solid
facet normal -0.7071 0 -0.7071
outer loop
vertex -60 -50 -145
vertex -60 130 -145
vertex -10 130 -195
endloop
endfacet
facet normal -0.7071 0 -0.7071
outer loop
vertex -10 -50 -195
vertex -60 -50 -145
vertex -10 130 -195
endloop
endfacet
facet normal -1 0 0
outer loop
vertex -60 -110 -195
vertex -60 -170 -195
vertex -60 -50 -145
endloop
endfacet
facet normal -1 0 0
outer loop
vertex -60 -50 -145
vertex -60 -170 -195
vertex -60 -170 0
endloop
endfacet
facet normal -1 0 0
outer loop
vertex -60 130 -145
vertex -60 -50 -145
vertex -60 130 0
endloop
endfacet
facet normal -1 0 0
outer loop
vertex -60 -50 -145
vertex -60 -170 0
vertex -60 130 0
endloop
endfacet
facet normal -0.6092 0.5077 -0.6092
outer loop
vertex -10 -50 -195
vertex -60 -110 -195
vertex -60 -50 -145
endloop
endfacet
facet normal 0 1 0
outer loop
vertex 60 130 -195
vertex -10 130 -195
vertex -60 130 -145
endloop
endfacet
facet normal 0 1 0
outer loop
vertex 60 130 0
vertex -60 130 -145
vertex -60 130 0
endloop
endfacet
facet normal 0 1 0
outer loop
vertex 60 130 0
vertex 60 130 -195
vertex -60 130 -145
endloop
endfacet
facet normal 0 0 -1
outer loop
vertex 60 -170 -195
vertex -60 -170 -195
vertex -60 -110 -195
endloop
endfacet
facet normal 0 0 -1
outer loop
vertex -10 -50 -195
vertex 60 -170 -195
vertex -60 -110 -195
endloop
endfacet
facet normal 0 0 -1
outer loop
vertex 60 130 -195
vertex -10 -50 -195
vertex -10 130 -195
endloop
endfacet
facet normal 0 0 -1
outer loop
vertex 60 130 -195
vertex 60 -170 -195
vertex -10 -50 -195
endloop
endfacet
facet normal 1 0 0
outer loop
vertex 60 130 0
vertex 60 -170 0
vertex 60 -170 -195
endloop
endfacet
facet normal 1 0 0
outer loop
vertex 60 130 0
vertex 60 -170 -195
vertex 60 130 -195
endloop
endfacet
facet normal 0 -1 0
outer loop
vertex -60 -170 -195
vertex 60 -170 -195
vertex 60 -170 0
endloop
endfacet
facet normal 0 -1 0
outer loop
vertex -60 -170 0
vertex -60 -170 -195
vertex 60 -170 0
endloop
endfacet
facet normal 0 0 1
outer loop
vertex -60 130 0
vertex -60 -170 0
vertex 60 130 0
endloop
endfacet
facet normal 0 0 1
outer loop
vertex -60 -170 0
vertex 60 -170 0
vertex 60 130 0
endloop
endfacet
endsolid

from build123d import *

# Parameters (mm, degrees)
F0_W     = 300
F0_H     = 195
F1_DEPTH = 60
F3_DEPTH = 180
F7_DEPTH = 121.842539816


with BuildPart() as f1:
    # F0 (on Right) → F1 (new body, symmetric)
    with BuildSketch(Plane.YZ):
        with Locations((-20, -97.5)):
            Rectangle(F0_W, F0_H)
    extrude(amount=F1_DEPTH, both=True)

    # F2 (on face) → F3 (cut)
    with BuildSketch(Plane(origin=(0, 130, 0), x_dir=(-1, 0, 0), z_dir=(0, 1, 0))):
        Polygon((60, -145), (10, -195), (60, -195), align=None)
    extrude(amount=-F3_DEPTH, mode=Mode.SUBTRACT)

    # F6 (on 3pt) → F7 (cut, through all)
    with BuildSketch(Plane(origin=(-60.618556701, 50.5154639175, -60.618556701), x_dir=(0.7930107057, 0.3900052651, -0.4680063181), z_dir=(-0.6092076991, 0.5076730826, -0.6092076991))):
        Polygon((0.7800105302, 209.3402986903), (0.7800105302, 131.2378019312), (63.8308617224, 163.2470219144), align=None)
    extrude(amount=F7_DEPTH, mode=Mode.SUBTRACT)


solid = f1.part
